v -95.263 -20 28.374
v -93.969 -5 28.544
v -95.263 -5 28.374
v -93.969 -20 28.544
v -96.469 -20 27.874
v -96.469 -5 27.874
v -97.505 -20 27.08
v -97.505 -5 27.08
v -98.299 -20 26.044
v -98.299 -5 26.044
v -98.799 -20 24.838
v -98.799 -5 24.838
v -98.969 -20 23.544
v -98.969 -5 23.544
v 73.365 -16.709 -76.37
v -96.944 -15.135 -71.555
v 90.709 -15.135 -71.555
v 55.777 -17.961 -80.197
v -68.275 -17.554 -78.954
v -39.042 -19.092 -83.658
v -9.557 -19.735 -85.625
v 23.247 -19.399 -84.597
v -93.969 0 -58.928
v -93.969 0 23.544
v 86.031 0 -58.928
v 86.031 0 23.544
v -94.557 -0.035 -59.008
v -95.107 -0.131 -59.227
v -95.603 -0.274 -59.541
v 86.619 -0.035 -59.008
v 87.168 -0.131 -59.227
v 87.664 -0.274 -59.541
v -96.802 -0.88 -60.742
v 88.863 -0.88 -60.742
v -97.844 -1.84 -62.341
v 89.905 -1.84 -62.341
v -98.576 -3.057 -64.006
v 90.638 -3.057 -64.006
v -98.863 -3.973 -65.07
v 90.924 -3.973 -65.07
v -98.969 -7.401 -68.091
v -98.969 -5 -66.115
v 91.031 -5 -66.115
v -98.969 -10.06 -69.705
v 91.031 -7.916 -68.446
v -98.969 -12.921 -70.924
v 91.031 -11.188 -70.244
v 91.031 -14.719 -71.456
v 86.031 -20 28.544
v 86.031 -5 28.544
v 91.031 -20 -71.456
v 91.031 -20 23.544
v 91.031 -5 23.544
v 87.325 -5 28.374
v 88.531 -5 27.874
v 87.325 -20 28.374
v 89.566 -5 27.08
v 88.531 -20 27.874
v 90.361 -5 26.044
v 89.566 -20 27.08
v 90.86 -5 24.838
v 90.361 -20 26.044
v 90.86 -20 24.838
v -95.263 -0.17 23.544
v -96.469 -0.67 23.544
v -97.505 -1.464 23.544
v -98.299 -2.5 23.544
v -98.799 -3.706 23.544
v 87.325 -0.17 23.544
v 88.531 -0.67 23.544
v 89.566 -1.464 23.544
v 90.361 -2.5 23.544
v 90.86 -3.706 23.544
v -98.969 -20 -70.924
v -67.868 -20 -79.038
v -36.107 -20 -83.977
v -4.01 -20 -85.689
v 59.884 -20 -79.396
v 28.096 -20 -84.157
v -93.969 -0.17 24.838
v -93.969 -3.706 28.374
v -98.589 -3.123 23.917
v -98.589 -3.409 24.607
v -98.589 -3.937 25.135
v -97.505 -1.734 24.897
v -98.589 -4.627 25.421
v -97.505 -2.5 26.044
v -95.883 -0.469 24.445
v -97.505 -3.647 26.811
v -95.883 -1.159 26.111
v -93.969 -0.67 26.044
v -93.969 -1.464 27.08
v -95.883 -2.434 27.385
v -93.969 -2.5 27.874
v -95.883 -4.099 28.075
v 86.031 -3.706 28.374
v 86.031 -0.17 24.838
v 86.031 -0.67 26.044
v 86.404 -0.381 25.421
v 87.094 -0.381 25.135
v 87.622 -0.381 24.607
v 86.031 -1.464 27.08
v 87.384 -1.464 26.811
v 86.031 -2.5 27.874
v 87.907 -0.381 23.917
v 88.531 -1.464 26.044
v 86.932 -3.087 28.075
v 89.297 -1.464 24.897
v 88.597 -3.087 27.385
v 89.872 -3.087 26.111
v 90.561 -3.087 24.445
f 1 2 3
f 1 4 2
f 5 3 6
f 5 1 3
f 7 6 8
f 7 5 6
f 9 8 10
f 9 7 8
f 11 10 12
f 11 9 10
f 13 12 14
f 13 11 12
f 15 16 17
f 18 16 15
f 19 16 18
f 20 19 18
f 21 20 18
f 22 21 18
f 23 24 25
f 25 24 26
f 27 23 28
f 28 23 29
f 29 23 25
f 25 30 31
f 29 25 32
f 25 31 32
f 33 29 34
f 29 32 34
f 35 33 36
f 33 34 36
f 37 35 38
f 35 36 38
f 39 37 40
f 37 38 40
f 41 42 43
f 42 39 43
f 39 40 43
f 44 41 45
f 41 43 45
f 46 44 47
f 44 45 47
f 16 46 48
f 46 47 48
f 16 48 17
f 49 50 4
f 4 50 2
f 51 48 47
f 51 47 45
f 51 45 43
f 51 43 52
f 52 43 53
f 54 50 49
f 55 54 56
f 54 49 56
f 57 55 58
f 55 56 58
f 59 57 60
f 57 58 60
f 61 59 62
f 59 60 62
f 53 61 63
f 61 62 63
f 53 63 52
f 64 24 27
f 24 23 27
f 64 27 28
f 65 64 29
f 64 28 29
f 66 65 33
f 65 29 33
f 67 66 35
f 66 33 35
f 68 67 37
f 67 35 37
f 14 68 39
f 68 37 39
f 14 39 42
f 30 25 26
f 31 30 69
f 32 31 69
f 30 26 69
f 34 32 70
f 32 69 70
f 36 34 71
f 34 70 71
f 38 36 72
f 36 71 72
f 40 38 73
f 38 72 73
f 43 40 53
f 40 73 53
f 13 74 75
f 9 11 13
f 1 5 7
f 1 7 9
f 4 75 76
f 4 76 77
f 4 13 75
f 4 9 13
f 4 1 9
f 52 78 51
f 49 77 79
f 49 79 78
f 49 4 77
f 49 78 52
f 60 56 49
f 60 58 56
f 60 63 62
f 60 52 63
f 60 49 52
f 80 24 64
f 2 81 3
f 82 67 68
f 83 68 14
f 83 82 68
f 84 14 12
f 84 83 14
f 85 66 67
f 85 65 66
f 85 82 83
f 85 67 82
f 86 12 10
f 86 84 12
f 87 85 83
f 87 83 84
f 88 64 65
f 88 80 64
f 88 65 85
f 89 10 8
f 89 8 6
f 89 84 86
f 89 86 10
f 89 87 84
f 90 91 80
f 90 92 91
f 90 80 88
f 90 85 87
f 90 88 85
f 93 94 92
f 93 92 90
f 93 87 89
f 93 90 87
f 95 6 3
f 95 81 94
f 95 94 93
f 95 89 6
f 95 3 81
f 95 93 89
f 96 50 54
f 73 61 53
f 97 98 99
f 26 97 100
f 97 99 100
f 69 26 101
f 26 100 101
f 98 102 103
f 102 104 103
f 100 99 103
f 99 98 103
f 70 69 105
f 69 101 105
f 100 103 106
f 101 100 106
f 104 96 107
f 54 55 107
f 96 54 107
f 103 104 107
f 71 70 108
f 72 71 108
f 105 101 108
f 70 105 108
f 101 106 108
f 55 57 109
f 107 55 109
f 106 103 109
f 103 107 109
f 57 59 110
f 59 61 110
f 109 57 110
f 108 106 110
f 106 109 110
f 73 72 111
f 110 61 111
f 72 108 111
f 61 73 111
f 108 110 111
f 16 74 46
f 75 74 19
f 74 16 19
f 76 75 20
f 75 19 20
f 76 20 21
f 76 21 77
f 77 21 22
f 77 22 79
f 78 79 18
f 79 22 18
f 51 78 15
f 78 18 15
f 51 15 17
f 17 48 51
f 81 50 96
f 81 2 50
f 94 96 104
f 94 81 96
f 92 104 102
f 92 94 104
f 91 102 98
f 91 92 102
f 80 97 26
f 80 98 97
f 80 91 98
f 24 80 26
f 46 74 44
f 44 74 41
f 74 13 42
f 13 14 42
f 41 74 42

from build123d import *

# Parameters (mm, degrees)
F1_DEPTH = 20
F3_DEPTH = 100
F4_R     = 5


with BuildPart() as f1:
    # F0 (on Front) → F1 (new body)
    with BuildSketch(Plane.XZ):
        with BuildLine():
            Line((91.030714, 28.54419), (-98.969286, 28.54419))
            Line((-98.969286, 28.54419), (-98.969286, -70.923594))
            ThreePointArc((-98.969286, -70.923594), (-4.0099, -85.688886), (91.030714, -71.45581))
            Line((91.030714, -71.45581), (91.030714, 28.54419))
        make_face()
    extrude(amount=F1_DEPTH)

    # F2 (on Right) → F3 (cut, symmetric)
    with BuildSketch(Plane.YZ):
        with BuildLine():
            ThreePointArc((0, -41.784719), (-0.601025, -60.211753), (-15.13516, -71.555287))
            Line((-15.13516, -71.555287), (-19.817429, -85.876599))
            Line((-19.817429, -85.876599), (3.398273, -87.581709))
            Line((3.398273, -87.581709), (10.874517, -61.349276))
            Line((10.874517, -61.349276), (0, -41.784719))
        make_face()
    extrude(amount=F3_DEPTH, both=True, mode=Mode.SUBTRACT)

    # F4
    f4_edges = [f1.edges().sort_by_distance(p)[0] for p in [
        (91.030714, -10, 28.54419),
        (-3.969286, 0, 28.54419),
        (-98.969286, 0, -15.191684),
        (-98.969286, -10, 28.54419),
        (91.030714, 0, -15.191684),
    ]]
    fillet(f4_edges, radius=F4_R)


solid = f1.part
